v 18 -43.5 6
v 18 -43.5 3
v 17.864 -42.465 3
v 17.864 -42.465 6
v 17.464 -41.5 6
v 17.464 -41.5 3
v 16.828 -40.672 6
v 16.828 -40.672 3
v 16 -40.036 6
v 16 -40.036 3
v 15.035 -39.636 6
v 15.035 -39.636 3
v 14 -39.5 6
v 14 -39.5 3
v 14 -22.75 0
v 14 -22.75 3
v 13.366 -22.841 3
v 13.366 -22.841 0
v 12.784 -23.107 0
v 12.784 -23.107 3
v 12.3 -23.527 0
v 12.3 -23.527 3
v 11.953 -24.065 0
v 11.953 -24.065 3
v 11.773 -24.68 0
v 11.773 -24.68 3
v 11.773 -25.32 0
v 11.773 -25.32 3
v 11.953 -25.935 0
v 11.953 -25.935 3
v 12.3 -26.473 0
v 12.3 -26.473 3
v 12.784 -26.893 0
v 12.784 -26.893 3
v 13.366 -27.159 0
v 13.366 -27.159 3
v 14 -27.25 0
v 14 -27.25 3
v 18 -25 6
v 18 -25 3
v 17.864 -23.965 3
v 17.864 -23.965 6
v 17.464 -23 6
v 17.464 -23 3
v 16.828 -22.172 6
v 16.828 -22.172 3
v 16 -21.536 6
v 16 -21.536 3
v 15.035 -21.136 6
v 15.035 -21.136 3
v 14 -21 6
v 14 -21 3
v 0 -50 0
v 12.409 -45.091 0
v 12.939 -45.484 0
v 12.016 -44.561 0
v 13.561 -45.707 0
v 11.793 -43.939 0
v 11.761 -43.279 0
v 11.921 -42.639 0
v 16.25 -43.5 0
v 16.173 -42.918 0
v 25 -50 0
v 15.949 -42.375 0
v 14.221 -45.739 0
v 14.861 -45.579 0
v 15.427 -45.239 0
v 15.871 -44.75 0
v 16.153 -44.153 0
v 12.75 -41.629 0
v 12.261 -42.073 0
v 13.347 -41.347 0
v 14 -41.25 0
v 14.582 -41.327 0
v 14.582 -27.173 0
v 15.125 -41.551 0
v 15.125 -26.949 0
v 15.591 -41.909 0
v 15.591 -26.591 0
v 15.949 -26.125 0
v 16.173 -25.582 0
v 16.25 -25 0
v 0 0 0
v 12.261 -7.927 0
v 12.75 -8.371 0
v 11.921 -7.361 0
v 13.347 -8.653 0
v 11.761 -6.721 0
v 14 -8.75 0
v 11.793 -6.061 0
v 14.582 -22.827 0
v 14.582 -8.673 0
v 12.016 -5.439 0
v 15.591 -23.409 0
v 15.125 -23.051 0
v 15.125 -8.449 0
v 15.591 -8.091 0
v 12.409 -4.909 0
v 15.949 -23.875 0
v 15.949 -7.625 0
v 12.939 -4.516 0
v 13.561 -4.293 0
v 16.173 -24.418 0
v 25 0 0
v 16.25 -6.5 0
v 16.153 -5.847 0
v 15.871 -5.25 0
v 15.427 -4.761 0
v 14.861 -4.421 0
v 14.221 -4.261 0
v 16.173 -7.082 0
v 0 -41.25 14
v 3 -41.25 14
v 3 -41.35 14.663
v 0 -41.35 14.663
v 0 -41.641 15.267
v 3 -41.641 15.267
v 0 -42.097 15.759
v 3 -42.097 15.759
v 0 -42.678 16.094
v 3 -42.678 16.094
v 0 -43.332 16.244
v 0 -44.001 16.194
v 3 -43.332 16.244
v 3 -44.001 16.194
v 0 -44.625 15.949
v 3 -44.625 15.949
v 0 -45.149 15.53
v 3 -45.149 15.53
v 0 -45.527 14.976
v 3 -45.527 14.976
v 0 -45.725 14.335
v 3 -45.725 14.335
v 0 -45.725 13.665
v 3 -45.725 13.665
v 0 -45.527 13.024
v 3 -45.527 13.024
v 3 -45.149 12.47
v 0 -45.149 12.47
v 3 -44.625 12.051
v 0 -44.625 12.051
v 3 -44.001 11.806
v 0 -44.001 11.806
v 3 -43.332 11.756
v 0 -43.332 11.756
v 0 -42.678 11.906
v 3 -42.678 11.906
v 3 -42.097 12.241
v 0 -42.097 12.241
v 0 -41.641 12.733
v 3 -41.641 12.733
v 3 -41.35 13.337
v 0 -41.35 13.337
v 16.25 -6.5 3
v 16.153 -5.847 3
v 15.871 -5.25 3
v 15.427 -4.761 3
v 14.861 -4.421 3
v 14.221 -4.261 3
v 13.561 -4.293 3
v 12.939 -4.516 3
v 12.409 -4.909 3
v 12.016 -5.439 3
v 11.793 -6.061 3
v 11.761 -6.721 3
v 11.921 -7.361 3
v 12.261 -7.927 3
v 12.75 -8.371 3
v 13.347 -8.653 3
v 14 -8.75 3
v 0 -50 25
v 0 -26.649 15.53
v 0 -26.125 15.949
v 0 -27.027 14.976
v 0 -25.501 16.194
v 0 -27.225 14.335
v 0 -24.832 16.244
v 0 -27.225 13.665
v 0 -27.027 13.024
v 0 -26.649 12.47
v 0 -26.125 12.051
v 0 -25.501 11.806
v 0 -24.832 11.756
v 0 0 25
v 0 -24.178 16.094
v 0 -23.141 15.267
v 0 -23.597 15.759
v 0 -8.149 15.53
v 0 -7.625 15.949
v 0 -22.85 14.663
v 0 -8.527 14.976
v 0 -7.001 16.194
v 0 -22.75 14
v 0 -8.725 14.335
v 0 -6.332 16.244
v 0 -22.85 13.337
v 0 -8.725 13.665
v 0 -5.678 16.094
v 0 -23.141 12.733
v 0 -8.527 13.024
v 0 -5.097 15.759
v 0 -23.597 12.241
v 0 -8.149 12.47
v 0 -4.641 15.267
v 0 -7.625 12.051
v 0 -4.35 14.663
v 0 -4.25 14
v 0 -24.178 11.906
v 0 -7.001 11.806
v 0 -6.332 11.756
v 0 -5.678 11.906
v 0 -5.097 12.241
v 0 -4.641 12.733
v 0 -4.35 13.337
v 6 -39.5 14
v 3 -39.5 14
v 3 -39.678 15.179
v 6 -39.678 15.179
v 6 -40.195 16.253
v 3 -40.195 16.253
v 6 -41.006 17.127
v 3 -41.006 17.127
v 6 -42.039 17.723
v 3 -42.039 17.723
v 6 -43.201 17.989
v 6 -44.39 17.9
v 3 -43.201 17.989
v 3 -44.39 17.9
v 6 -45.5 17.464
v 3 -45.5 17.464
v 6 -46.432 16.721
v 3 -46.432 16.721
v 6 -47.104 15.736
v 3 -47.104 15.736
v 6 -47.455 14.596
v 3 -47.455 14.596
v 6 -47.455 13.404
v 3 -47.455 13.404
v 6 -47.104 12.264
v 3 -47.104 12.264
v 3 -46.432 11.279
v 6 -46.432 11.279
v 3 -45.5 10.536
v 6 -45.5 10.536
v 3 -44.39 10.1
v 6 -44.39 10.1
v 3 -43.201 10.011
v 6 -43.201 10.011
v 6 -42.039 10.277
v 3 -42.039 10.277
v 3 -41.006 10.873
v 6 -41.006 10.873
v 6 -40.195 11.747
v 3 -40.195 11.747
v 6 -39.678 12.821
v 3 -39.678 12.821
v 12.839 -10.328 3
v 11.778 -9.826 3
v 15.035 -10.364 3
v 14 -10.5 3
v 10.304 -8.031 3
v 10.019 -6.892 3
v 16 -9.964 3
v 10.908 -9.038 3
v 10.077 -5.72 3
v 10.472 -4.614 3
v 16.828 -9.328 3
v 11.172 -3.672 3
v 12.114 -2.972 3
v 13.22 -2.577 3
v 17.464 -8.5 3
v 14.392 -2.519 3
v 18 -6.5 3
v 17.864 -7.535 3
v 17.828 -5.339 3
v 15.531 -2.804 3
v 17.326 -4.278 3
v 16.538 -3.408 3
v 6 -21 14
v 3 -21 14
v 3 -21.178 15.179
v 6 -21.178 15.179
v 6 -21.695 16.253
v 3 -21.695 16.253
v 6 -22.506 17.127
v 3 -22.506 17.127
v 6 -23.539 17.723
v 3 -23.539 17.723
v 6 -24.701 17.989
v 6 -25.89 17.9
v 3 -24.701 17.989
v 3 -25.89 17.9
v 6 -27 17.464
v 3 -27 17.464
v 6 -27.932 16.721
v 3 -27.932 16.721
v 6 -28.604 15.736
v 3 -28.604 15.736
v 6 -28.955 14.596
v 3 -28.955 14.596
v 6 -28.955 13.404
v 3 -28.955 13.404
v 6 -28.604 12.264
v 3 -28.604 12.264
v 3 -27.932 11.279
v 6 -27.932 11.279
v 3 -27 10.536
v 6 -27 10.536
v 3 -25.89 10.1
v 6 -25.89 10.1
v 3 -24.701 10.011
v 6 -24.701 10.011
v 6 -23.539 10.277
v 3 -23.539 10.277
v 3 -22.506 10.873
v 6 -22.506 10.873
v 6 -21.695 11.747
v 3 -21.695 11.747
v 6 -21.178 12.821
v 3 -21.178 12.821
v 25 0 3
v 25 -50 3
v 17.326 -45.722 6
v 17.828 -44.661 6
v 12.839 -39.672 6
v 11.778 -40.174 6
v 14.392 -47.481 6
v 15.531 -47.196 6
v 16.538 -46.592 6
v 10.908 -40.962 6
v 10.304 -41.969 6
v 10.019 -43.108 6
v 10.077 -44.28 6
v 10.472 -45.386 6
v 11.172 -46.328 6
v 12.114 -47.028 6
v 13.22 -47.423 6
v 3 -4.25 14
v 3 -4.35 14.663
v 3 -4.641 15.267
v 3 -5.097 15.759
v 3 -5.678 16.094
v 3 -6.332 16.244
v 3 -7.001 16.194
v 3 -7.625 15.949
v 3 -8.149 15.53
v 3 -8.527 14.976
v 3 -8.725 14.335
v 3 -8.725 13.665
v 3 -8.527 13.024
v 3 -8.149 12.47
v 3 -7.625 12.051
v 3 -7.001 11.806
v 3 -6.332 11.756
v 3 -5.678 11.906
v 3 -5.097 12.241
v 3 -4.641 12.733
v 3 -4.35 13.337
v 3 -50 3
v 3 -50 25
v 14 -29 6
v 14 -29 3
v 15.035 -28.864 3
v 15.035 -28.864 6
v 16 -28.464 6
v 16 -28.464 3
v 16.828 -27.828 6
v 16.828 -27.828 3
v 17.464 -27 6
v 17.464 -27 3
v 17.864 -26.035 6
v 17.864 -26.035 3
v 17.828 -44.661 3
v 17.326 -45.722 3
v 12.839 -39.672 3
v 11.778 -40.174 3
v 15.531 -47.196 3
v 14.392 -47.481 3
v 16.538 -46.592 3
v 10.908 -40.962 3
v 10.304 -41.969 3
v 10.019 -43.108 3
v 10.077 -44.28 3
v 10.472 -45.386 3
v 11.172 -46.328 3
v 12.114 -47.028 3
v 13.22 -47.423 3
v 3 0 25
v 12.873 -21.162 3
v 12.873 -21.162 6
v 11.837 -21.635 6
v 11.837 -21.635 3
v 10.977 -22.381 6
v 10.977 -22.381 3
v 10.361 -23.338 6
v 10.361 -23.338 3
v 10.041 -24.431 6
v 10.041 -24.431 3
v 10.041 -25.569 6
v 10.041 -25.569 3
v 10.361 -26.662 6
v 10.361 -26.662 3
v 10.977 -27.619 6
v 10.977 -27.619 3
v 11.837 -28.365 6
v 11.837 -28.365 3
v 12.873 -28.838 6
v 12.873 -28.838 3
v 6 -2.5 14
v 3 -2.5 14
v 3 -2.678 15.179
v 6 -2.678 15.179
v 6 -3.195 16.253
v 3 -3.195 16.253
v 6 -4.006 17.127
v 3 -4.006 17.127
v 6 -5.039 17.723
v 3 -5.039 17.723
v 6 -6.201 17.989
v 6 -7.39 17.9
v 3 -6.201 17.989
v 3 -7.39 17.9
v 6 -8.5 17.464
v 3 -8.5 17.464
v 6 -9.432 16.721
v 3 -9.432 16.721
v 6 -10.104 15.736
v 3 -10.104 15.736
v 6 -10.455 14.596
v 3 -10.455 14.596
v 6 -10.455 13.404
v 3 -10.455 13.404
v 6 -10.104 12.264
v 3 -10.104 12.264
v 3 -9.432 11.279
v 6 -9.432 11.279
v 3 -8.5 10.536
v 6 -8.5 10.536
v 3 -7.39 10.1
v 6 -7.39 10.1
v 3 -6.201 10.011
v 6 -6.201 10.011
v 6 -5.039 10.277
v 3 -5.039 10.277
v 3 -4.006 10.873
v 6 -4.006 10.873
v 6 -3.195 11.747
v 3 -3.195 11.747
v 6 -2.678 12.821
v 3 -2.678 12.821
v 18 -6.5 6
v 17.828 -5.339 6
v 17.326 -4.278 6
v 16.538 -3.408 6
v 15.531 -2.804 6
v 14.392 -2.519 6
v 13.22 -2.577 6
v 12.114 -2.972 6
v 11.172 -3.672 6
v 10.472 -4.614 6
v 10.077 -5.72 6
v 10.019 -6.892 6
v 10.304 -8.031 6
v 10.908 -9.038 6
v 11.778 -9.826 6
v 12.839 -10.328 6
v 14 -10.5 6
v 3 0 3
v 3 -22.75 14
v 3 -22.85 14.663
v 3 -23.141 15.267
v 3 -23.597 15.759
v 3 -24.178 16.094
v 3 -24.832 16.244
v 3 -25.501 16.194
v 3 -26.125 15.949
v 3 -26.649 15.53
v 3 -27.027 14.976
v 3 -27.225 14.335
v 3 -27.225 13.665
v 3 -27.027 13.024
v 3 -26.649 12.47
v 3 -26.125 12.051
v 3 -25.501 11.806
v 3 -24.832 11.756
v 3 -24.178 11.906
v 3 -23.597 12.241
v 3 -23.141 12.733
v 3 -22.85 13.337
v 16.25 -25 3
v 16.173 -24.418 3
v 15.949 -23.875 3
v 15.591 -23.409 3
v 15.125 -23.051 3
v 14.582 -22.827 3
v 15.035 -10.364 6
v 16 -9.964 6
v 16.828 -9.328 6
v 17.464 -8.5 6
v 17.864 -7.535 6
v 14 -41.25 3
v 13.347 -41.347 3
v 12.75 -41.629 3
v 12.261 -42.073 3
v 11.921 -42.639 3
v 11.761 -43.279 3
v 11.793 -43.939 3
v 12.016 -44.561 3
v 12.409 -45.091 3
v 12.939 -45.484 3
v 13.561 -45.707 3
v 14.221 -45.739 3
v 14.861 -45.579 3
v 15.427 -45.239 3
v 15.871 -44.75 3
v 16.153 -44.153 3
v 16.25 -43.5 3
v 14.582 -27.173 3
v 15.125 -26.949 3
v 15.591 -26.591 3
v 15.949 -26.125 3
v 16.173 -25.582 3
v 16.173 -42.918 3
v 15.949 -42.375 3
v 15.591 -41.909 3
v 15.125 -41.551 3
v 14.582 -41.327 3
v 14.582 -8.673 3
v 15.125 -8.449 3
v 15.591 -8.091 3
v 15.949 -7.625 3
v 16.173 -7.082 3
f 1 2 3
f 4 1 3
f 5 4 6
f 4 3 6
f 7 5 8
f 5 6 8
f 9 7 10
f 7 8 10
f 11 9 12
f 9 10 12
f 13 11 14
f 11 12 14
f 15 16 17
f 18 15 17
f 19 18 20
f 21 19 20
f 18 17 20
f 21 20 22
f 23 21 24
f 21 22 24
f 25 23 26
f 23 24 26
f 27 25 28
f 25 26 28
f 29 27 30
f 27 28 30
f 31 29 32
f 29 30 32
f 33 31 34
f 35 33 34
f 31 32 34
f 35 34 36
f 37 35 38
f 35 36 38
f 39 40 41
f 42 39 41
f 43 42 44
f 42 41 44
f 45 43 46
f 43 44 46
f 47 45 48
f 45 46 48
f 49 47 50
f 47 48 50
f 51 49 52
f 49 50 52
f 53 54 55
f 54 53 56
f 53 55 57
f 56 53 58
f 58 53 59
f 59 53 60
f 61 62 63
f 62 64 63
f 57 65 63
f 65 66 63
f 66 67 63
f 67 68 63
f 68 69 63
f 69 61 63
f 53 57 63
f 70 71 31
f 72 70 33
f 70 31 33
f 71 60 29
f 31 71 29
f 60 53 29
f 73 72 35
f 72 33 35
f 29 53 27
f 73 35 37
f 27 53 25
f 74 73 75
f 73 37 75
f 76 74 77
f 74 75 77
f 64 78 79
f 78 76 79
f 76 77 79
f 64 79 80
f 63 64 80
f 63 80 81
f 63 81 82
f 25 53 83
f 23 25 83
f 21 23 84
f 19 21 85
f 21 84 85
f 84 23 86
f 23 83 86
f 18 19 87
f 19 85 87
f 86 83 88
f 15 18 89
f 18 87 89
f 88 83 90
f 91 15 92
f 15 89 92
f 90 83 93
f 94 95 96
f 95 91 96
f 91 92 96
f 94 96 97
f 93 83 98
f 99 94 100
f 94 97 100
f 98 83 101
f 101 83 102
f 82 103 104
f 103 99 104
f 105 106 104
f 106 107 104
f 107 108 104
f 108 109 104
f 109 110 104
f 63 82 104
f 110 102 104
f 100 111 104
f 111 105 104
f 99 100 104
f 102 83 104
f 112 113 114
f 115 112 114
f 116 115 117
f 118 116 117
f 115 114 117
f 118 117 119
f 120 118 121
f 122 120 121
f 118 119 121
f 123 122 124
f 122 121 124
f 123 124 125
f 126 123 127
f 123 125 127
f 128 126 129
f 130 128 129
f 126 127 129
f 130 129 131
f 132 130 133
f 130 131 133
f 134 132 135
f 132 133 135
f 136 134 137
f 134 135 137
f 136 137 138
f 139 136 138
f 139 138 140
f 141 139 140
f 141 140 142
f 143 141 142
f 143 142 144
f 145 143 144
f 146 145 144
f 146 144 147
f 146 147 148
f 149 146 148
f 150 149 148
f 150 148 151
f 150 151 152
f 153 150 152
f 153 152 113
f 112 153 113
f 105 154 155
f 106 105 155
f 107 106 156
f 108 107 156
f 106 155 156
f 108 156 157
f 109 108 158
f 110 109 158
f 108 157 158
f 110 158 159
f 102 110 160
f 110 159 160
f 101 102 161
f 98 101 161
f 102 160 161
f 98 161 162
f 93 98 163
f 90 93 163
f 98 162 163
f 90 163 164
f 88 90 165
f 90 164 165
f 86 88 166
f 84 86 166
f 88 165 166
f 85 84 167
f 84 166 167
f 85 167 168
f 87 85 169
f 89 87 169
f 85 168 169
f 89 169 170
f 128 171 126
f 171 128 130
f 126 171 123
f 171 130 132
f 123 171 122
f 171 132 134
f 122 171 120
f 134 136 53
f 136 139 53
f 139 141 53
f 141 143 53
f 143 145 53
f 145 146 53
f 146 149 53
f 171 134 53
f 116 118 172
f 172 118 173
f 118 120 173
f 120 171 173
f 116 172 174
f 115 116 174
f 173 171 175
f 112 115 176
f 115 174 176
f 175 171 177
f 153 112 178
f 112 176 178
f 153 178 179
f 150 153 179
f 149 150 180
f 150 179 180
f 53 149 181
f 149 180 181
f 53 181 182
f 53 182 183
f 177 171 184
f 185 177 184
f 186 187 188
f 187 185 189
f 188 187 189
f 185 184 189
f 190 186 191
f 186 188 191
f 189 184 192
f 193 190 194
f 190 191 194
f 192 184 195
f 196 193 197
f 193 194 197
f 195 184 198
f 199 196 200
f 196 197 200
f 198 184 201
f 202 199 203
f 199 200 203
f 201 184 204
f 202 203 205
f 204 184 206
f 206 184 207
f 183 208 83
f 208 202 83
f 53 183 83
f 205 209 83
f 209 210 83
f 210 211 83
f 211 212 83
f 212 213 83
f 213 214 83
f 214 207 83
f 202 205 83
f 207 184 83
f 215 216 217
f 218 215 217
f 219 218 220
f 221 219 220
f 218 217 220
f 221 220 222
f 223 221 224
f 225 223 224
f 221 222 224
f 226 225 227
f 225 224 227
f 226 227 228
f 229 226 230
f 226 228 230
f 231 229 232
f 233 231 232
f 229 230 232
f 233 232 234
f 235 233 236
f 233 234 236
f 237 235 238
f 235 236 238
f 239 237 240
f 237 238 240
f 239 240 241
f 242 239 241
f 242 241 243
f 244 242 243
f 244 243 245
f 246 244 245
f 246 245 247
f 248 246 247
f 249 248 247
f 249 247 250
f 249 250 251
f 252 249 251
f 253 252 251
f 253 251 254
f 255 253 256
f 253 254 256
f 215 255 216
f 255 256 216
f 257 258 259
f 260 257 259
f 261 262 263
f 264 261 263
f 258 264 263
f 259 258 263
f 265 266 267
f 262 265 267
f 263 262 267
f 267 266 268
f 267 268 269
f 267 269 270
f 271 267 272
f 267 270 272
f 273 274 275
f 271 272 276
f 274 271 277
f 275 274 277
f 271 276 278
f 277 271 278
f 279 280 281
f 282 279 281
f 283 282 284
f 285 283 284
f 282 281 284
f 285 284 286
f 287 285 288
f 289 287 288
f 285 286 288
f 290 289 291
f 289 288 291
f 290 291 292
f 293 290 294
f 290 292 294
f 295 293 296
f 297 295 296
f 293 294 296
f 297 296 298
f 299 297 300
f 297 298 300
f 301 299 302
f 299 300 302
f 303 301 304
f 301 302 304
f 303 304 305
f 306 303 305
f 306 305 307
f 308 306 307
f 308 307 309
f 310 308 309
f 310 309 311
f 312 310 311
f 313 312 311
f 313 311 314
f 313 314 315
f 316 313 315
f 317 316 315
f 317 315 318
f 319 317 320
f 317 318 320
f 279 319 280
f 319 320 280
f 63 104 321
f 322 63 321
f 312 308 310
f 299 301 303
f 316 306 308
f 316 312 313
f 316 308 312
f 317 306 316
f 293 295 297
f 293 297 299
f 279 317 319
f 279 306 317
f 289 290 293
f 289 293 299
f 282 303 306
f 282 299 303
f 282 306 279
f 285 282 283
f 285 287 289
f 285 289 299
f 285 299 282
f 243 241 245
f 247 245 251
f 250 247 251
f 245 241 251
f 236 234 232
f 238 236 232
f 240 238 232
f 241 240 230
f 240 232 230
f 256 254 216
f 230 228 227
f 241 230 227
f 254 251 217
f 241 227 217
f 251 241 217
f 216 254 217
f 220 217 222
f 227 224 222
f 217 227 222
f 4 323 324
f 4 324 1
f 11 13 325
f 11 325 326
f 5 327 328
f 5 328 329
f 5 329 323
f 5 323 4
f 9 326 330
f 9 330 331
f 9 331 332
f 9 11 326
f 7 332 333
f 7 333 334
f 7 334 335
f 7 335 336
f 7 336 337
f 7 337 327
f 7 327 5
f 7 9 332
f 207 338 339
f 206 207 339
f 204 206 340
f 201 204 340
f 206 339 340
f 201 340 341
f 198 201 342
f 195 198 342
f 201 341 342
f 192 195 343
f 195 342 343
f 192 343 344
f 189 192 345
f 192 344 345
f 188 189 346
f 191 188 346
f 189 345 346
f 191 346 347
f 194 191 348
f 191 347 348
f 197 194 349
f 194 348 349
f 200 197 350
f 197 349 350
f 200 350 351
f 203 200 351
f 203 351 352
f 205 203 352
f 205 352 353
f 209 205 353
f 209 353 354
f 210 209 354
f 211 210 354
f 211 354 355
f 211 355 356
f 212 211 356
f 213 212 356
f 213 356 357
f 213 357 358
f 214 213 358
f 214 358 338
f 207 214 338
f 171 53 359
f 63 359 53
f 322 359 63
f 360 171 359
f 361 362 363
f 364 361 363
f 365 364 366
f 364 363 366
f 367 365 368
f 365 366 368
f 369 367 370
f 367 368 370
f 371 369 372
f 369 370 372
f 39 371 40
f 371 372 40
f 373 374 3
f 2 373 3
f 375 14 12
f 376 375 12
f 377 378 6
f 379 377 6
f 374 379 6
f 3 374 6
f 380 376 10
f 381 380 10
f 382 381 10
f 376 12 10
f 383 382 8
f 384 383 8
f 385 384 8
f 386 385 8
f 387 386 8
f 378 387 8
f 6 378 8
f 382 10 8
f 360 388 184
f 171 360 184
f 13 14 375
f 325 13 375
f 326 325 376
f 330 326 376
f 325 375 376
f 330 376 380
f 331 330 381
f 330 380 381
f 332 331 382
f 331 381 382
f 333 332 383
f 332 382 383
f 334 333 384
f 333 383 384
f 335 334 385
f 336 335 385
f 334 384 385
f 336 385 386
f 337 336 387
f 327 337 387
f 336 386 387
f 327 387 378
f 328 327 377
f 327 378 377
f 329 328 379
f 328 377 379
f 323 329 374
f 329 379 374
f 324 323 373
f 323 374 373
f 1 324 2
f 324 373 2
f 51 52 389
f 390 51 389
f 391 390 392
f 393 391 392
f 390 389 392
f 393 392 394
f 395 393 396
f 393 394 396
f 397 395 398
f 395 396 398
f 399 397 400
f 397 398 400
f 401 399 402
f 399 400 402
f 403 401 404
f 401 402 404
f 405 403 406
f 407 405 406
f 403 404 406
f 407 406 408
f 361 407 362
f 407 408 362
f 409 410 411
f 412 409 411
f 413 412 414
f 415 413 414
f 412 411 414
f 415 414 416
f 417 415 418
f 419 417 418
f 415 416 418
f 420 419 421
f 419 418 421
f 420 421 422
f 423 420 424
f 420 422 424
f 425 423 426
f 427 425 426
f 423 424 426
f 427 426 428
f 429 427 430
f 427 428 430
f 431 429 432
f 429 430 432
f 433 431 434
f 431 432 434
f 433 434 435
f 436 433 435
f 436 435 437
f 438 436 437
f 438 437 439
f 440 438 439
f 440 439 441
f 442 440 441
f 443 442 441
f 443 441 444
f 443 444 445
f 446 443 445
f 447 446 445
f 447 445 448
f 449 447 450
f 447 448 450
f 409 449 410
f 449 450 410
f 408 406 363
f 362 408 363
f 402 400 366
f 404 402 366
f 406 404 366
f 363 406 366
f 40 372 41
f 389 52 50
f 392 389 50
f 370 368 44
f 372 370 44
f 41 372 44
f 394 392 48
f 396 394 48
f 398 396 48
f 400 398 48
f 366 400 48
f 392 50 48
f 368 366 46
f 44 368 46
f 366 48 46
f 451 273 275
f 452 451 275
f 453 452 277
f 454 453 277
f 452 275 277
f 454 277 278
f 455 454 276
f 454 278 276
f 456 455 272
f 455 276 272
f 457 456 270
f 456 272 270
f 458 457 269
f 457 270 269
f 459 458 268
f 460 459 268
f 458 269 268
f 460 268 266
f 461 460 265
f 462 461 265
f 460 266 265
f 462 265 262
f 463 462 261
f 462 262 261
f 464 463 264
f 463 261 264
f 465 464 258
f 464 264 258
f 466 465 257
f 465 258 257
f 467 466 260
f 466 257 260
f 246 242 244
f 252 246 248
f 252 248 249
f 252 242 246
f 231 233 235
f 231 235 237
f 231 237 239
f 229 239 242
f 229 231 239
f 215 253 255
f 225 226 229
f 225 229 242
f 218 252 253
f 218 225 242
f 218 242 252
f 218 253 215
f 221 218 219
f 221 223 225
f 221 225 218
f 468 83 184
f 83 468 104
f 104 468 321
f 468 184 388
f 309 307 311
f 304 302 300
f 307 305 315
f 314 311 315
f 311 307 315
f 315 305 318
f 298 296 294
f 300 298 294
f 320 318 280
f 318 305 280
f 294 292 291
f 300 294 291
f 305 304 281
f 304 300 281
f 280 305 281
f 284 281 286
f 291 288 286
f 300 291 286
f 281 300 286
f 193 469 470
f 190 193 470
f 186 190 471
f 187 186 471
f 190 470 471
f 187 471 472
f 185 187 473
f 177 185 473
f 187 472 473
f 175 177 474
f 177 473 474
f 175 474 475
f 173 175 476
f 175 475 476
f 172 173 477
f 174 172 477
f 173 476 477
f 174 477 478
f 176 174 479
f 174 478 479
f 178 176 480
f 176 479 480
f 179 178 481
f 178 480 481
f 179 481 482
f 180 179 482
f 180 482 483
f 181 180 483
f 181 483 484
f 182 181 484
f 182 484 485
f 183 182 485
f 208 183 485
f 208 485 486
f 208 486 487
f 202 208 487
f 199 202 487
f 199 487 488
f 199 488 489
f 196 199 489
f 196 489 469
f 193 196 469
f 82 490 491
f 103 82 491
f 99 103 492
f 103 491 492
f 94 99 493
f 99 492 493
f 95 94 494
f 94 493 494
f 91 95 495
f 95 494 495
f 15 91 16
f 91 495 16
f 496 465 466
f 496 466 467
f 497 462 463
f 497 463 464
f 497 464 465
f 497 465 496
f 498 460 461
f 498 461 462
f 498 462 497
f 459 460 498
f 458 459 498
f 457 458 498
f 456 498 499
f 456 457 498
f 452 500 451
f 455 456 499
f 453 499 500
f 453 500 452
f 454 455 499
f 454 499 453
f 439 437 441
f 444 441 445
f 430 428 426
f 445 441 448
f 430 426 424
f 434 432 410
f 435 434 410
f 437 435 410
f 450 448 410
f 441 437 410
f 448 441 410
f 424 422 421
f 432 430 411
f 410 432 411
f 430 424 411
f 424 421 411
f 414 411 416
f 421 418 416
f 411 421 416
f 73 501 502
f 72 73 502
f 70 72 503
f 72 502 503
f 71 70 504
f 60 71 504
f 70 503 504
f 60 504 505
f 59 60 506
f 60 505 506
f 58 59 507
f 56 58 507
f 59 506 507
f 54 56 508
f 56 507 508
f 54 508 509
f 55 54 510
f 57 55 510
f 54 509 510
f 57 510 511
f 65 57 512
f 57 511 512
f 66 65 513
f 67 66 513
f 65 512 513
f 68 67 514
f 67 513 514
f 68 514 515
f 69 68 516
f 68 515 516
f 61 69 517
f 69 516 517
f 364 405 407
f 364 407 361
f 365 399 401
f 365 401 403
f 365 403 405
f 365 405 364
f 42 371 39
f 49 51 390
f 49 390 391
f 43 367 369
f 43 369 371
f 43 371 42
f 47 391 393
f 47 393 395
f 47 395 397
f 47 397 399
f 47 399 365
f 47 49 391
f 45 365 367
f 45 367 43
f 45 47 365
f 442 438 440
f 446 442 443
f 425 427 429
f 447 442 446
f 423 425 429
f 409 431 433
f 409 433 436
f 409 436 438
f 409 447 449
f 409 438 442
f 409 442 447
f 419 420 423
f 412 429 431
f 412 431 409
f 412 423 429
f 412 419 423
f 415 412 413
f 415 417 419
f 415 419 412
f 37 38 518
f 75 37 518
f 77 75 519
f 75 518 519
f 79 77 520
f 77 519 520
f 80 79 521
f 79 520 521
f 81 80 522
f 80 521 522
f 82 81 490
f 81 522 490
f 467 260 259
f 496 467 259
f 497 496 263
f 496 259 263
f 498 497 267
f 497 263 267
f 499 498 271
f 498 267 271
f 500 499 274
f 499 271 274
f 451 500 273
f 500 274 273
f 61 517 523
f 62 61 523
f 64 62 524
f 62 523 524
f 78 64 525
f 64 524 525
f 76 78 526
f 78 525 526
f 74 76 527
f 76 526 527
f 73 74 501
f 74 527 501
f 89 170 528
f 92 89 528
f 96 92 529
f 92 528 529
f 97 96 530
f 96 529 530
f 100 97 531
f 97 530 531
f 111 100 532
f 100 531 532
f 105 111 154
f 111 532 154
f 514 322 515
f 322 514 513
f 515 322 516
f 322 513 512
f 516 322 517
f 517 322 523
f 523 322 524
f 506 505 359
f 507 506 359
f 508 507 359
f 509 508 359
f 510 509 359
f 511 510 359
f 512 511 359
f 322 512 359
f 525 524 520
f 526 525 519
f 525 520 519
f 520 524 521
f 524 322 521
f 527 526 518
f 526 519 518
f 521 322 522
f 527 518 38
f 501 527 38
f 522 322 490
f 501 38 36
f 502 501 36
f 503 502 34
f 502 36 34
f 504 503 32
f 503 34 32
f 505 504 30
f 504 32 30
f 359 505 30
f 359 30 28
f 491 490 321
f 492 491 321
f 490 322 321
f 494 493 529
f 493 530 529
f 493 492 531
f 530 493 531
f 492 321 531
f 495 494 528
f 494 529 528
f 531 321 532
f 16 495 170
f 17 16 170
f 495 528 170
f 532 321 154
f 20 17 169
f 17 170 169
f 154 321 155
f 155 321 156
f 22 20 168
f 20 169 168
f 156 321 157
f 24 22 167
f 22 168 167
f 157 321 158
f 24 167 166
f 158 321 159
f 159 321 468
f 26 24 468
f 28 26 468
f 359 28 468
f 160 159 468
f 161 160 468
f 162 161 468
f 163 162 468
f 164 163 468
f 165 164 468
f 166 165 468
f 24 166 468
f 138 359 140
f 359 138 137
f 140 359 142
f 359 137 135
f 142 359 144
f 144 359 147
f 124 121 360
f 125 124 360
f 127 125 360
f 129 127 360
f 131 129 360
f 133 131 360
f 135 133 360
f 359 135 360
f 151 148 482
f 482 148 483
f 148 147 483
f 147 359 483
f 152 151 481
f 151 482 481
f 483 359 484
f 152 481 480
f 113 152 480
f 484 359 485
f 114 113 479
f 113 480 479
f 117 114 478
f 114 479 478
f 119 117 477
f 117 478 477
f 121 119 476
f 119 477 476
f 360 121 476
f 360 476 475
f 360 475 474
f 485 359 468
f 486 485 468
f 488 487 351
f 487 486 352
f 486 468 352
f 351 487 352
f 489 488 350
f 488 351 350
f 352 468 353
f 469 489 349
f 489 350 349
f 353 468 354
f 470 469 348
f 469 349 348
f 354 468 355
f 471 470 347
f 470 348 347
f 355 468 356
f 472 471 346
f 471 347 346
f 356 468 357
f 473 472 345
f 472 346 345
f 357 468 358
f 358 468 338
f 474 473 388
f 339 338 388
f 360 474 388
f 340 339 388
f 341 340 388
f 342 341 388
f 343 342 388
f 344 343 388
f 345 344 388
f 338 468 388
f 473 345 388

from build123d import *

# Parameters (mm, degrees)
F2_DEPTH = 50
F3_R     = 2.25
F5_R     = 2.25
F6_DEPTH = 3.001
F7_DEPTH = 3.001
F8_DEPTH = 3
F5_R_2   = 4
F9_DEPTH = 3
F3_R_2   = 4


with BuildPart() as f2:
    # F1 (on Front) → F2 (new body)
    with BuildSketch(Plane.XZ):
        Polygon((0, 25), (0, 0), (25, 0), (25, 3), (3, 3), (3, 25), align=None)
    extrude(amount=F2_DEPTH)

    # F3 (on face) + F5 (on face) → F6 (cut, through all)
    with BuildSketch(Plane.YZ.offset(3)):
        with Locations((-43.5, 14)):
            Circle(F3_R)
    with BuildSketch(Plane.YZ.offset(3)):
        with Locations((-6.5, 14)):
            Circle(F5_R)
        with Locations((-25, 14)):
            Circle(F5_R)
    extrude(amount=-F6_DEPTH, mode=Mode.SUBTRACT)

    # F4 (on face) → F7 (cut, through all)
    with BuildSketch(Plane.XY.offset(3)):
        with BuildLine():
            ThreePointArc((16.25, -43.5), (15.5909902577, -41.9090097423), (14, -41.25))
            ThreePointArc((14, -41.25), (12.4090097423, -45.0909902577), (16.25, -43.5))
        make_face()
        with BuildLine():
            ThreePointArc((16.25, -6.5), (12.4090097423, -4.9090097423), (14, -8.75))
            ThreePointArc((14, -8.75), (15.5909902577, -8.0909902577), (16.25, -6.5))
        make_face()
        with BuildLine():
            ThreePointArc((14, -22.75), (11.75, -25), (14, -27.25))
            Line((14, -27.25), (14, -25))
            Line((14, -25), (14, -22.75))
        make_face()
        with BuildLine():
            Line((14, -25), (14, -27.25))
            ThreePointArc((14, -27.25), (15.5909902577, -26.5909902577), (16.25, -25))
            ThreePointArc((16.25, -25), (15.5909902577, -23.4090097423), (14, -22.75))
            Line((14, -22.75), (14, -25))
        make_face()
    extrude(amount=-F7_DEPTH, mode=Mode.SUBTRACT)


with BuildPart() as f8:
    # F4 (on face) → F8 (new body)
    with BuildSketch(Plane.XY.offset(3)):
        with BuildLine():
            ThreePointArc((18, -6.5), (11.1715728753, -3.6715728753), (14, -10.5))
            ThreePointArc((14, -10.5), (16.8284271247, -9.3284271247), (18, -6.5))
        make_face()
        with BuildLine():
            ThreePointArc((16.25, -6.5), (15.5909902577, -8.0909902577), (14, -8.75))
            ThreePointArc((14, -8.75), (12.4090097423, -4.9090097423), (16.25, -6.5))
        make_face(mode=Mode.SUBTRACT)
        with BuildLine():
            ThreePointArc((16.25, -6.5), (12.4090097423, -4.9090097423), (14, -8.75))
            ThreePointArc((14, -8.75), (15.5909902577, -8.0909902577), (16.25, -6.5))
        make_face()
    extrude(amount=F8_DEPTH)


with BuildPart() as f8b:
    # F4 (on face) → F8, piece 2 (new body)
    with BuildSketch(Plane.XY.offset(3)):
        with BuildLine():
            Line((14, -27.25), (14, -29))
            ThreePointArc((14, -29), (16.8284271247, -27.8284271247), (18, -25))
            ThreePointArc((18, -25), (16.8284271247, -22.1715728753), (14, -21))
            Line((14, -21), (14, -22.75))
            ThreePointArc((14, -22.75), (15.5909902577, -23.4090097423), (16.25, -25))
            ThreePointArc((16.25, -25), (15.5909902577, -26.5909902577), (14, -27.25))
        make_face()
        with BuildLine():
            ThreePointArc((14, -21), (10, -25), (14, -29))
            Line((14, -29), (14, -27.25))
            ThreePointArc((14, -27.25), (11.75, -25), (14, -22.75))
            Line((14, -22.75), (14, -21))
        make_face()
        with BuildLine():
            Line((14, -25), (14, -27.25))
            ThreePointArc((14, -27.25), (15.5909902577, -26.5909902577), (16.25, -25))
            ThreePointArc((16.25, -25), (15.5909902577, -23.4090097423), (14, -22.75))
            Line((14, -22.75), (14, -25))
        make_face()
        with BuildLine():
            ThreePointArc((14, -22.75), (11.75, -25), (14, -27.25))
            Line((14, -27.25), (14, -25))
            Line((14, -25), (14, -22.75))
        make_face()
    extrude(amount=F8_DEPTH)


with BuildPart() as f8c:
    # F4 (on face) → F8, piece 3 (new body)
    with BuildSketch(Plane.XY.offset(3)):
        with BuildLine():
            ThreePointArc((18, -43.5), (16.8284271247, -40.6715728753), (14, -39.5))
            ThreePointArc((14, -39.5), (11.1715728753, -46.3284271247), (18, -43.5))
        make_face()
        with BuildLine():
            ThreePointArc((16.25, -43.5), (12.4090097423, -45.0909902577), (14, -41.25))
            ThreePointArc((14, -41.25), (15.5909902577, -41.9090097423), (16.25, -43.5))
        make_face(mode=Mode.SUBTRACT)
        with BuildLine():
            ThreePointArc((16.25, -43.5), (15.5909902577, -41.9090097423), (14, -41.25))
            ThreePointArc((14, -41.25), (12.4090097423, -45.0909902577), (16.25, -43.5))
        make_face()
    extrude(amount=F8_DEPTH)


with BuildPart() as f9:
    # F5 (on face) → F9 (new body)
    with BuildSketch(Plane.YZ.offset(3)):
        with Locations((-6.5, 14)):
            Circle(F5_R_2)
        with Locations((-6.5, 14)):
            Circle(F5_R, mode=Mode.SUBTRACT)
        with Locations((-6.5, 14)):
            Circle(F5_R)
    extrude(amount=F9_DEPTH)


with BuildPart() as f9b:
    # F5 (on face) → F9, piece 2 (new body)
    with BuildSketch(Plane.YZ.offset(3)):
        with Locations((-25, 14)):
            Circle(F5_R_2)
        with Locations((-25, 14)):
            Circle(F5_R, mode=Mode.SUBTRACT)
        with Locations((-25, 14)):
            Circle(F5_R)
    extrude(amount=F9_DEPTH)


with BuildPart() as f9c:
    # F3 (on face) → F9, piece 3 (new body)
    with BuildSketch(Plane.YZ.offset(3)):
        with Locations((-43.5, 14)):
            Circle(F3_R_2)
        with Locations((-43.5, 14)):
            Circle(F3_R, mode=Mode.SUBTRACT)
        with Locations((-43.5, 14)):
            Circle(F3_R)
    extrude(amount=F9_DEPTH)


solid = Compound([f2.part, f8.part, f8b.part, f8c.part, f9.part, f9b.part, f9c.part])
